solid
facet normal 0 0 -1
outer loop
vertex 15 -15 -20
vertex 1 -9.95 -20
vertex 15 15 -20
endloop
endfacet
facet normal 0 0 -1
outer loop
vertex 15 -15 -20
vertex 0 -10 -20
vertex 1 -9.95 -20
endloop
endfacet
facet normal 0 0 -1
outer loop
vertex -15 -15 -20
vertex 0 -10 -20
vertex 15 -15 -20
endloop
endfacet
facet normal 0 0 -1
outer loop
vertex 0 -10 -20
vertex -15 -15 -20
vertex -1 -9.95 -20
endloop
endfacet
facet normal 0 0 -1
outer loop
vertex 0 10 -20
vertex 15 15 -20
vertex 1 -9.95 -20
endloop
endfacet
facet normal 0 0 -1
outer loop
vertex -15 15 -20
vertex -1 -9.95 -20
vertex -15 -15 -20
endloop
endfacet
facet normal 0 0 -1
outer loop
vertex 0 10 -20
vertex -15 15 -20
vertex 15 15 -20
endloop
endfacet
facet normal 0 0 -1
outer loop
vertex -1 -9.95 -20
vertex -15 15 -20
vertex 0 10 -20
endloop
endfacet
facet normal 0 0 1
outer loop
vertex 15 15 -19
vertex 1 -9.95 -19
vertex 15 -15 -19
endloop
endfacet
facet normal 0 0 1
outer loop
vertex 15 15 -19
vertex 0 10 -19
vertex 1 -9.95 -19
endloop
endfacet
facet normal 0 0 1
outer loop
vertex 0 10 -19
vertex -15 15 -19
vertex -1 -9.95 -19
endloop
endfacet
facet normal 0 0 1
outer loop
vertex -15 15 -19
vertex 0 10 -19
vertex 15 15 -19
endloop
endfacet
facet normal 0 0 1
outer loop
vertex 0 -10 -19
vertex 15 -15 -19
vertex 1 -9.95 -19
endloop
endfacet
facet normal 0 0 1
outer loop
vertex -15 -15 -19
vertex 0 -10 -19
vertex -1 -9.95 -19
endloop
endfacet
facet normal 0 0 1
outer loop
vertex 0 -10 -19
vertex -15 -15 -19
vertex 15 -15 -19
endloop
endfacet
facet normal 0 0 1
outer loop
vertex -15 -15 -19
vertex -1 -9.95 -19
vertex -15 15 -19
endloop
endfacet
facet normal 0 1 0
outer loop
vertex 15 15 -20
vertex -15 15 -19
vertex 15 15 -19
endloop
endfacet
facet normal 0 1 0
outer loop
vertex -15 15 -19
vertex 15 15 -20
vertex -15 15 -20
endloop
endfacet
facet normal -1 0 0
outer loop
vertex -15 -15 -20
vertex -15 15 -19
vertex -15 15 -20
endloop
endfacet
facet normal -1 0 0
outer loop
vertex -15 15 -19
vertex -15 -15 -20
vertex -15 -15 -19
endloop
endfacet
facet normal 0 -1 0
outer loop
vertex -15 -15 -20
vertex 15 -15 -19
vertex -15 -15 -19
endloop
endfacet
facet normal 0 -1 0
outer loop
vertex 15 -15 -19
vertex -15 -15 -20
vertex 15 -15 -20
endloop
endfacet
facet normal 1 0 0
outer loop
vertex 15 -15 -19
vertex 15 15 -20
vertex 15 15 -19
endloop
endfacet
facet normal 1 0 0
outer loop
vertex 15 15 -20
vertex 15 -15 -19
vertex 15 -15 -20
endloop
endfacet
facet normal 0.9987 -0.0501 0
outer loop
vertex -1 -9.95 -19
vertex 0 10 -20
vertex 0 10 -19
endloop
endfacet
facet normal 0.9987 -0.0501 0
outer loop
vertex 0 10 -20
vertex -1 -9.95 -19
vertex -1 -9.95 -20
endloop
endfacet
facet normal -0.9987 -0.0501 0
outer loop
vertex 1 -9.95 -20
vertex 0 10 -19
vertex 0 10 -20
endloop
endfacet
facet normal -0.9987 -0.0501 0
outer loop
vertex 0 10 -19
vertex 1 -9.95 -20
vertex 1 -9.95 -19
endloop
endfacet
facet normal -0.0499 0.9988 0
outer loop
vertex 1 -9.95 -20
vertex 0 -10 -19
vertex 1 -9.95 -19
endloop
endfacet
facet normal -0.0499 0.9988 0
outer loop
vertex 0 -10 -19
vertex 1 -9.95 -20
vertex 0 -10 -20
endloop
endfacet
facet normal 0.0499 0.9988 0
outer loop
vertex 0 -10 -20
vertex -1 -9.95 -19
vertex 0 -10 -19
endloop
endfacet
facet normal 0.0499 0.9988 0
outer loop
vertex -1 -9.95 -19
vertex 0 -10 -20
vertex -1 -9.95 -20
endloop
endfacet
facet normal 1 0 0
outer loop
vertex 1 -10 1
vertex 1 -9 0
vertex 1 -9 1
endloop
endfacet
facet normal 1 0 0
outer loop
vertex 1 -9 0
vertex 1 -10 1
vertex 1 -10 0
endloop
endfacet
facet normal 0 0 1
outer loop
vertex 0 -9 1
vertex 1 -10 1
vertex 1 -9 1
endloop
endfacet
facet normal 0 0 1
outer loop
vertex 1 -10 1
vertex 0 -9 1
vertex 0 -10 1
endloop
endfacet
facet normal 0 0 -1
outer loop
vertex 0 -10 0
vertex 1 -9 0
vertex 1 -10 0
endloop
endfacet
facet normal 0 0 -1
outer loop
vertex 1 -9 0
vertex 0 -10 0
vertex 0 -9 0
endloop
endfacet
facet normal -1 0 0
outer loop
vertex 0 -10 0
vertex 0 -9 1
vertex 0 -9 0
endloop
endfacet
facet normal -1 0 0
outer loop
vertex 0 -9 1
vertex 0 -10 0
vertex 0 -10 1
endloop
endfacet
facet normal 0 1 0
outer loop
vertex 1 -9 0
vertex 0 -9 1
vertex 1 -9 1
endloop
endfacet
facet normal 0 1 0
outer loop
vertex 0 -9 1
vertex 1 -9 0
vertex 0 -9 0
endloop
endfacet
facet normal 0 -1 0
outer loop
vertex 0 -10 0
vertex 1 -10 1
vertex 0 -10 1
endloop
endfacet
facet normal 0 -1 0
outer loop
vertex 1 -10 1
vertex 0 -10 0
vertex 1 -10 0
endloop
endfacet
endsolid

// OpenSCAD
// Issue #6582: CGAL assertion "itl != it->second.end()" in applyUnion3D.
//
// The polygon below contains three consecutive vertices A, B, C closer to each other
// than GRID_FINE (2^-20). This is what projection() of examples/Basics/projection.stl
// produces. When converting the extruded PolySet to a Nef polyhedron, vertex
// quantization used to snap B onto A's grid cell while leaving C in place, which flips
// the long skinny cap triangle (B, C, [15,-15]) and yields a self-intersecting (corrupt)
// Nef polyhedron. Unioning that with any object located near B then failed.
translate([0, 0, -20])
  linear_extrude(1)
    difference() {
      square(30, center=true);
      polygon([
        [-1, -9.95],
        [5.9902668e-6, -9.99999989569187], // A
        [5.9977174e-6, -10],               // B
        [8.0019236e-6, -10],               // C
        [1, -9.95],
        [0, 10]
      ]);
    }

translate([8/1048576, -10, 0])
  cube(1);
